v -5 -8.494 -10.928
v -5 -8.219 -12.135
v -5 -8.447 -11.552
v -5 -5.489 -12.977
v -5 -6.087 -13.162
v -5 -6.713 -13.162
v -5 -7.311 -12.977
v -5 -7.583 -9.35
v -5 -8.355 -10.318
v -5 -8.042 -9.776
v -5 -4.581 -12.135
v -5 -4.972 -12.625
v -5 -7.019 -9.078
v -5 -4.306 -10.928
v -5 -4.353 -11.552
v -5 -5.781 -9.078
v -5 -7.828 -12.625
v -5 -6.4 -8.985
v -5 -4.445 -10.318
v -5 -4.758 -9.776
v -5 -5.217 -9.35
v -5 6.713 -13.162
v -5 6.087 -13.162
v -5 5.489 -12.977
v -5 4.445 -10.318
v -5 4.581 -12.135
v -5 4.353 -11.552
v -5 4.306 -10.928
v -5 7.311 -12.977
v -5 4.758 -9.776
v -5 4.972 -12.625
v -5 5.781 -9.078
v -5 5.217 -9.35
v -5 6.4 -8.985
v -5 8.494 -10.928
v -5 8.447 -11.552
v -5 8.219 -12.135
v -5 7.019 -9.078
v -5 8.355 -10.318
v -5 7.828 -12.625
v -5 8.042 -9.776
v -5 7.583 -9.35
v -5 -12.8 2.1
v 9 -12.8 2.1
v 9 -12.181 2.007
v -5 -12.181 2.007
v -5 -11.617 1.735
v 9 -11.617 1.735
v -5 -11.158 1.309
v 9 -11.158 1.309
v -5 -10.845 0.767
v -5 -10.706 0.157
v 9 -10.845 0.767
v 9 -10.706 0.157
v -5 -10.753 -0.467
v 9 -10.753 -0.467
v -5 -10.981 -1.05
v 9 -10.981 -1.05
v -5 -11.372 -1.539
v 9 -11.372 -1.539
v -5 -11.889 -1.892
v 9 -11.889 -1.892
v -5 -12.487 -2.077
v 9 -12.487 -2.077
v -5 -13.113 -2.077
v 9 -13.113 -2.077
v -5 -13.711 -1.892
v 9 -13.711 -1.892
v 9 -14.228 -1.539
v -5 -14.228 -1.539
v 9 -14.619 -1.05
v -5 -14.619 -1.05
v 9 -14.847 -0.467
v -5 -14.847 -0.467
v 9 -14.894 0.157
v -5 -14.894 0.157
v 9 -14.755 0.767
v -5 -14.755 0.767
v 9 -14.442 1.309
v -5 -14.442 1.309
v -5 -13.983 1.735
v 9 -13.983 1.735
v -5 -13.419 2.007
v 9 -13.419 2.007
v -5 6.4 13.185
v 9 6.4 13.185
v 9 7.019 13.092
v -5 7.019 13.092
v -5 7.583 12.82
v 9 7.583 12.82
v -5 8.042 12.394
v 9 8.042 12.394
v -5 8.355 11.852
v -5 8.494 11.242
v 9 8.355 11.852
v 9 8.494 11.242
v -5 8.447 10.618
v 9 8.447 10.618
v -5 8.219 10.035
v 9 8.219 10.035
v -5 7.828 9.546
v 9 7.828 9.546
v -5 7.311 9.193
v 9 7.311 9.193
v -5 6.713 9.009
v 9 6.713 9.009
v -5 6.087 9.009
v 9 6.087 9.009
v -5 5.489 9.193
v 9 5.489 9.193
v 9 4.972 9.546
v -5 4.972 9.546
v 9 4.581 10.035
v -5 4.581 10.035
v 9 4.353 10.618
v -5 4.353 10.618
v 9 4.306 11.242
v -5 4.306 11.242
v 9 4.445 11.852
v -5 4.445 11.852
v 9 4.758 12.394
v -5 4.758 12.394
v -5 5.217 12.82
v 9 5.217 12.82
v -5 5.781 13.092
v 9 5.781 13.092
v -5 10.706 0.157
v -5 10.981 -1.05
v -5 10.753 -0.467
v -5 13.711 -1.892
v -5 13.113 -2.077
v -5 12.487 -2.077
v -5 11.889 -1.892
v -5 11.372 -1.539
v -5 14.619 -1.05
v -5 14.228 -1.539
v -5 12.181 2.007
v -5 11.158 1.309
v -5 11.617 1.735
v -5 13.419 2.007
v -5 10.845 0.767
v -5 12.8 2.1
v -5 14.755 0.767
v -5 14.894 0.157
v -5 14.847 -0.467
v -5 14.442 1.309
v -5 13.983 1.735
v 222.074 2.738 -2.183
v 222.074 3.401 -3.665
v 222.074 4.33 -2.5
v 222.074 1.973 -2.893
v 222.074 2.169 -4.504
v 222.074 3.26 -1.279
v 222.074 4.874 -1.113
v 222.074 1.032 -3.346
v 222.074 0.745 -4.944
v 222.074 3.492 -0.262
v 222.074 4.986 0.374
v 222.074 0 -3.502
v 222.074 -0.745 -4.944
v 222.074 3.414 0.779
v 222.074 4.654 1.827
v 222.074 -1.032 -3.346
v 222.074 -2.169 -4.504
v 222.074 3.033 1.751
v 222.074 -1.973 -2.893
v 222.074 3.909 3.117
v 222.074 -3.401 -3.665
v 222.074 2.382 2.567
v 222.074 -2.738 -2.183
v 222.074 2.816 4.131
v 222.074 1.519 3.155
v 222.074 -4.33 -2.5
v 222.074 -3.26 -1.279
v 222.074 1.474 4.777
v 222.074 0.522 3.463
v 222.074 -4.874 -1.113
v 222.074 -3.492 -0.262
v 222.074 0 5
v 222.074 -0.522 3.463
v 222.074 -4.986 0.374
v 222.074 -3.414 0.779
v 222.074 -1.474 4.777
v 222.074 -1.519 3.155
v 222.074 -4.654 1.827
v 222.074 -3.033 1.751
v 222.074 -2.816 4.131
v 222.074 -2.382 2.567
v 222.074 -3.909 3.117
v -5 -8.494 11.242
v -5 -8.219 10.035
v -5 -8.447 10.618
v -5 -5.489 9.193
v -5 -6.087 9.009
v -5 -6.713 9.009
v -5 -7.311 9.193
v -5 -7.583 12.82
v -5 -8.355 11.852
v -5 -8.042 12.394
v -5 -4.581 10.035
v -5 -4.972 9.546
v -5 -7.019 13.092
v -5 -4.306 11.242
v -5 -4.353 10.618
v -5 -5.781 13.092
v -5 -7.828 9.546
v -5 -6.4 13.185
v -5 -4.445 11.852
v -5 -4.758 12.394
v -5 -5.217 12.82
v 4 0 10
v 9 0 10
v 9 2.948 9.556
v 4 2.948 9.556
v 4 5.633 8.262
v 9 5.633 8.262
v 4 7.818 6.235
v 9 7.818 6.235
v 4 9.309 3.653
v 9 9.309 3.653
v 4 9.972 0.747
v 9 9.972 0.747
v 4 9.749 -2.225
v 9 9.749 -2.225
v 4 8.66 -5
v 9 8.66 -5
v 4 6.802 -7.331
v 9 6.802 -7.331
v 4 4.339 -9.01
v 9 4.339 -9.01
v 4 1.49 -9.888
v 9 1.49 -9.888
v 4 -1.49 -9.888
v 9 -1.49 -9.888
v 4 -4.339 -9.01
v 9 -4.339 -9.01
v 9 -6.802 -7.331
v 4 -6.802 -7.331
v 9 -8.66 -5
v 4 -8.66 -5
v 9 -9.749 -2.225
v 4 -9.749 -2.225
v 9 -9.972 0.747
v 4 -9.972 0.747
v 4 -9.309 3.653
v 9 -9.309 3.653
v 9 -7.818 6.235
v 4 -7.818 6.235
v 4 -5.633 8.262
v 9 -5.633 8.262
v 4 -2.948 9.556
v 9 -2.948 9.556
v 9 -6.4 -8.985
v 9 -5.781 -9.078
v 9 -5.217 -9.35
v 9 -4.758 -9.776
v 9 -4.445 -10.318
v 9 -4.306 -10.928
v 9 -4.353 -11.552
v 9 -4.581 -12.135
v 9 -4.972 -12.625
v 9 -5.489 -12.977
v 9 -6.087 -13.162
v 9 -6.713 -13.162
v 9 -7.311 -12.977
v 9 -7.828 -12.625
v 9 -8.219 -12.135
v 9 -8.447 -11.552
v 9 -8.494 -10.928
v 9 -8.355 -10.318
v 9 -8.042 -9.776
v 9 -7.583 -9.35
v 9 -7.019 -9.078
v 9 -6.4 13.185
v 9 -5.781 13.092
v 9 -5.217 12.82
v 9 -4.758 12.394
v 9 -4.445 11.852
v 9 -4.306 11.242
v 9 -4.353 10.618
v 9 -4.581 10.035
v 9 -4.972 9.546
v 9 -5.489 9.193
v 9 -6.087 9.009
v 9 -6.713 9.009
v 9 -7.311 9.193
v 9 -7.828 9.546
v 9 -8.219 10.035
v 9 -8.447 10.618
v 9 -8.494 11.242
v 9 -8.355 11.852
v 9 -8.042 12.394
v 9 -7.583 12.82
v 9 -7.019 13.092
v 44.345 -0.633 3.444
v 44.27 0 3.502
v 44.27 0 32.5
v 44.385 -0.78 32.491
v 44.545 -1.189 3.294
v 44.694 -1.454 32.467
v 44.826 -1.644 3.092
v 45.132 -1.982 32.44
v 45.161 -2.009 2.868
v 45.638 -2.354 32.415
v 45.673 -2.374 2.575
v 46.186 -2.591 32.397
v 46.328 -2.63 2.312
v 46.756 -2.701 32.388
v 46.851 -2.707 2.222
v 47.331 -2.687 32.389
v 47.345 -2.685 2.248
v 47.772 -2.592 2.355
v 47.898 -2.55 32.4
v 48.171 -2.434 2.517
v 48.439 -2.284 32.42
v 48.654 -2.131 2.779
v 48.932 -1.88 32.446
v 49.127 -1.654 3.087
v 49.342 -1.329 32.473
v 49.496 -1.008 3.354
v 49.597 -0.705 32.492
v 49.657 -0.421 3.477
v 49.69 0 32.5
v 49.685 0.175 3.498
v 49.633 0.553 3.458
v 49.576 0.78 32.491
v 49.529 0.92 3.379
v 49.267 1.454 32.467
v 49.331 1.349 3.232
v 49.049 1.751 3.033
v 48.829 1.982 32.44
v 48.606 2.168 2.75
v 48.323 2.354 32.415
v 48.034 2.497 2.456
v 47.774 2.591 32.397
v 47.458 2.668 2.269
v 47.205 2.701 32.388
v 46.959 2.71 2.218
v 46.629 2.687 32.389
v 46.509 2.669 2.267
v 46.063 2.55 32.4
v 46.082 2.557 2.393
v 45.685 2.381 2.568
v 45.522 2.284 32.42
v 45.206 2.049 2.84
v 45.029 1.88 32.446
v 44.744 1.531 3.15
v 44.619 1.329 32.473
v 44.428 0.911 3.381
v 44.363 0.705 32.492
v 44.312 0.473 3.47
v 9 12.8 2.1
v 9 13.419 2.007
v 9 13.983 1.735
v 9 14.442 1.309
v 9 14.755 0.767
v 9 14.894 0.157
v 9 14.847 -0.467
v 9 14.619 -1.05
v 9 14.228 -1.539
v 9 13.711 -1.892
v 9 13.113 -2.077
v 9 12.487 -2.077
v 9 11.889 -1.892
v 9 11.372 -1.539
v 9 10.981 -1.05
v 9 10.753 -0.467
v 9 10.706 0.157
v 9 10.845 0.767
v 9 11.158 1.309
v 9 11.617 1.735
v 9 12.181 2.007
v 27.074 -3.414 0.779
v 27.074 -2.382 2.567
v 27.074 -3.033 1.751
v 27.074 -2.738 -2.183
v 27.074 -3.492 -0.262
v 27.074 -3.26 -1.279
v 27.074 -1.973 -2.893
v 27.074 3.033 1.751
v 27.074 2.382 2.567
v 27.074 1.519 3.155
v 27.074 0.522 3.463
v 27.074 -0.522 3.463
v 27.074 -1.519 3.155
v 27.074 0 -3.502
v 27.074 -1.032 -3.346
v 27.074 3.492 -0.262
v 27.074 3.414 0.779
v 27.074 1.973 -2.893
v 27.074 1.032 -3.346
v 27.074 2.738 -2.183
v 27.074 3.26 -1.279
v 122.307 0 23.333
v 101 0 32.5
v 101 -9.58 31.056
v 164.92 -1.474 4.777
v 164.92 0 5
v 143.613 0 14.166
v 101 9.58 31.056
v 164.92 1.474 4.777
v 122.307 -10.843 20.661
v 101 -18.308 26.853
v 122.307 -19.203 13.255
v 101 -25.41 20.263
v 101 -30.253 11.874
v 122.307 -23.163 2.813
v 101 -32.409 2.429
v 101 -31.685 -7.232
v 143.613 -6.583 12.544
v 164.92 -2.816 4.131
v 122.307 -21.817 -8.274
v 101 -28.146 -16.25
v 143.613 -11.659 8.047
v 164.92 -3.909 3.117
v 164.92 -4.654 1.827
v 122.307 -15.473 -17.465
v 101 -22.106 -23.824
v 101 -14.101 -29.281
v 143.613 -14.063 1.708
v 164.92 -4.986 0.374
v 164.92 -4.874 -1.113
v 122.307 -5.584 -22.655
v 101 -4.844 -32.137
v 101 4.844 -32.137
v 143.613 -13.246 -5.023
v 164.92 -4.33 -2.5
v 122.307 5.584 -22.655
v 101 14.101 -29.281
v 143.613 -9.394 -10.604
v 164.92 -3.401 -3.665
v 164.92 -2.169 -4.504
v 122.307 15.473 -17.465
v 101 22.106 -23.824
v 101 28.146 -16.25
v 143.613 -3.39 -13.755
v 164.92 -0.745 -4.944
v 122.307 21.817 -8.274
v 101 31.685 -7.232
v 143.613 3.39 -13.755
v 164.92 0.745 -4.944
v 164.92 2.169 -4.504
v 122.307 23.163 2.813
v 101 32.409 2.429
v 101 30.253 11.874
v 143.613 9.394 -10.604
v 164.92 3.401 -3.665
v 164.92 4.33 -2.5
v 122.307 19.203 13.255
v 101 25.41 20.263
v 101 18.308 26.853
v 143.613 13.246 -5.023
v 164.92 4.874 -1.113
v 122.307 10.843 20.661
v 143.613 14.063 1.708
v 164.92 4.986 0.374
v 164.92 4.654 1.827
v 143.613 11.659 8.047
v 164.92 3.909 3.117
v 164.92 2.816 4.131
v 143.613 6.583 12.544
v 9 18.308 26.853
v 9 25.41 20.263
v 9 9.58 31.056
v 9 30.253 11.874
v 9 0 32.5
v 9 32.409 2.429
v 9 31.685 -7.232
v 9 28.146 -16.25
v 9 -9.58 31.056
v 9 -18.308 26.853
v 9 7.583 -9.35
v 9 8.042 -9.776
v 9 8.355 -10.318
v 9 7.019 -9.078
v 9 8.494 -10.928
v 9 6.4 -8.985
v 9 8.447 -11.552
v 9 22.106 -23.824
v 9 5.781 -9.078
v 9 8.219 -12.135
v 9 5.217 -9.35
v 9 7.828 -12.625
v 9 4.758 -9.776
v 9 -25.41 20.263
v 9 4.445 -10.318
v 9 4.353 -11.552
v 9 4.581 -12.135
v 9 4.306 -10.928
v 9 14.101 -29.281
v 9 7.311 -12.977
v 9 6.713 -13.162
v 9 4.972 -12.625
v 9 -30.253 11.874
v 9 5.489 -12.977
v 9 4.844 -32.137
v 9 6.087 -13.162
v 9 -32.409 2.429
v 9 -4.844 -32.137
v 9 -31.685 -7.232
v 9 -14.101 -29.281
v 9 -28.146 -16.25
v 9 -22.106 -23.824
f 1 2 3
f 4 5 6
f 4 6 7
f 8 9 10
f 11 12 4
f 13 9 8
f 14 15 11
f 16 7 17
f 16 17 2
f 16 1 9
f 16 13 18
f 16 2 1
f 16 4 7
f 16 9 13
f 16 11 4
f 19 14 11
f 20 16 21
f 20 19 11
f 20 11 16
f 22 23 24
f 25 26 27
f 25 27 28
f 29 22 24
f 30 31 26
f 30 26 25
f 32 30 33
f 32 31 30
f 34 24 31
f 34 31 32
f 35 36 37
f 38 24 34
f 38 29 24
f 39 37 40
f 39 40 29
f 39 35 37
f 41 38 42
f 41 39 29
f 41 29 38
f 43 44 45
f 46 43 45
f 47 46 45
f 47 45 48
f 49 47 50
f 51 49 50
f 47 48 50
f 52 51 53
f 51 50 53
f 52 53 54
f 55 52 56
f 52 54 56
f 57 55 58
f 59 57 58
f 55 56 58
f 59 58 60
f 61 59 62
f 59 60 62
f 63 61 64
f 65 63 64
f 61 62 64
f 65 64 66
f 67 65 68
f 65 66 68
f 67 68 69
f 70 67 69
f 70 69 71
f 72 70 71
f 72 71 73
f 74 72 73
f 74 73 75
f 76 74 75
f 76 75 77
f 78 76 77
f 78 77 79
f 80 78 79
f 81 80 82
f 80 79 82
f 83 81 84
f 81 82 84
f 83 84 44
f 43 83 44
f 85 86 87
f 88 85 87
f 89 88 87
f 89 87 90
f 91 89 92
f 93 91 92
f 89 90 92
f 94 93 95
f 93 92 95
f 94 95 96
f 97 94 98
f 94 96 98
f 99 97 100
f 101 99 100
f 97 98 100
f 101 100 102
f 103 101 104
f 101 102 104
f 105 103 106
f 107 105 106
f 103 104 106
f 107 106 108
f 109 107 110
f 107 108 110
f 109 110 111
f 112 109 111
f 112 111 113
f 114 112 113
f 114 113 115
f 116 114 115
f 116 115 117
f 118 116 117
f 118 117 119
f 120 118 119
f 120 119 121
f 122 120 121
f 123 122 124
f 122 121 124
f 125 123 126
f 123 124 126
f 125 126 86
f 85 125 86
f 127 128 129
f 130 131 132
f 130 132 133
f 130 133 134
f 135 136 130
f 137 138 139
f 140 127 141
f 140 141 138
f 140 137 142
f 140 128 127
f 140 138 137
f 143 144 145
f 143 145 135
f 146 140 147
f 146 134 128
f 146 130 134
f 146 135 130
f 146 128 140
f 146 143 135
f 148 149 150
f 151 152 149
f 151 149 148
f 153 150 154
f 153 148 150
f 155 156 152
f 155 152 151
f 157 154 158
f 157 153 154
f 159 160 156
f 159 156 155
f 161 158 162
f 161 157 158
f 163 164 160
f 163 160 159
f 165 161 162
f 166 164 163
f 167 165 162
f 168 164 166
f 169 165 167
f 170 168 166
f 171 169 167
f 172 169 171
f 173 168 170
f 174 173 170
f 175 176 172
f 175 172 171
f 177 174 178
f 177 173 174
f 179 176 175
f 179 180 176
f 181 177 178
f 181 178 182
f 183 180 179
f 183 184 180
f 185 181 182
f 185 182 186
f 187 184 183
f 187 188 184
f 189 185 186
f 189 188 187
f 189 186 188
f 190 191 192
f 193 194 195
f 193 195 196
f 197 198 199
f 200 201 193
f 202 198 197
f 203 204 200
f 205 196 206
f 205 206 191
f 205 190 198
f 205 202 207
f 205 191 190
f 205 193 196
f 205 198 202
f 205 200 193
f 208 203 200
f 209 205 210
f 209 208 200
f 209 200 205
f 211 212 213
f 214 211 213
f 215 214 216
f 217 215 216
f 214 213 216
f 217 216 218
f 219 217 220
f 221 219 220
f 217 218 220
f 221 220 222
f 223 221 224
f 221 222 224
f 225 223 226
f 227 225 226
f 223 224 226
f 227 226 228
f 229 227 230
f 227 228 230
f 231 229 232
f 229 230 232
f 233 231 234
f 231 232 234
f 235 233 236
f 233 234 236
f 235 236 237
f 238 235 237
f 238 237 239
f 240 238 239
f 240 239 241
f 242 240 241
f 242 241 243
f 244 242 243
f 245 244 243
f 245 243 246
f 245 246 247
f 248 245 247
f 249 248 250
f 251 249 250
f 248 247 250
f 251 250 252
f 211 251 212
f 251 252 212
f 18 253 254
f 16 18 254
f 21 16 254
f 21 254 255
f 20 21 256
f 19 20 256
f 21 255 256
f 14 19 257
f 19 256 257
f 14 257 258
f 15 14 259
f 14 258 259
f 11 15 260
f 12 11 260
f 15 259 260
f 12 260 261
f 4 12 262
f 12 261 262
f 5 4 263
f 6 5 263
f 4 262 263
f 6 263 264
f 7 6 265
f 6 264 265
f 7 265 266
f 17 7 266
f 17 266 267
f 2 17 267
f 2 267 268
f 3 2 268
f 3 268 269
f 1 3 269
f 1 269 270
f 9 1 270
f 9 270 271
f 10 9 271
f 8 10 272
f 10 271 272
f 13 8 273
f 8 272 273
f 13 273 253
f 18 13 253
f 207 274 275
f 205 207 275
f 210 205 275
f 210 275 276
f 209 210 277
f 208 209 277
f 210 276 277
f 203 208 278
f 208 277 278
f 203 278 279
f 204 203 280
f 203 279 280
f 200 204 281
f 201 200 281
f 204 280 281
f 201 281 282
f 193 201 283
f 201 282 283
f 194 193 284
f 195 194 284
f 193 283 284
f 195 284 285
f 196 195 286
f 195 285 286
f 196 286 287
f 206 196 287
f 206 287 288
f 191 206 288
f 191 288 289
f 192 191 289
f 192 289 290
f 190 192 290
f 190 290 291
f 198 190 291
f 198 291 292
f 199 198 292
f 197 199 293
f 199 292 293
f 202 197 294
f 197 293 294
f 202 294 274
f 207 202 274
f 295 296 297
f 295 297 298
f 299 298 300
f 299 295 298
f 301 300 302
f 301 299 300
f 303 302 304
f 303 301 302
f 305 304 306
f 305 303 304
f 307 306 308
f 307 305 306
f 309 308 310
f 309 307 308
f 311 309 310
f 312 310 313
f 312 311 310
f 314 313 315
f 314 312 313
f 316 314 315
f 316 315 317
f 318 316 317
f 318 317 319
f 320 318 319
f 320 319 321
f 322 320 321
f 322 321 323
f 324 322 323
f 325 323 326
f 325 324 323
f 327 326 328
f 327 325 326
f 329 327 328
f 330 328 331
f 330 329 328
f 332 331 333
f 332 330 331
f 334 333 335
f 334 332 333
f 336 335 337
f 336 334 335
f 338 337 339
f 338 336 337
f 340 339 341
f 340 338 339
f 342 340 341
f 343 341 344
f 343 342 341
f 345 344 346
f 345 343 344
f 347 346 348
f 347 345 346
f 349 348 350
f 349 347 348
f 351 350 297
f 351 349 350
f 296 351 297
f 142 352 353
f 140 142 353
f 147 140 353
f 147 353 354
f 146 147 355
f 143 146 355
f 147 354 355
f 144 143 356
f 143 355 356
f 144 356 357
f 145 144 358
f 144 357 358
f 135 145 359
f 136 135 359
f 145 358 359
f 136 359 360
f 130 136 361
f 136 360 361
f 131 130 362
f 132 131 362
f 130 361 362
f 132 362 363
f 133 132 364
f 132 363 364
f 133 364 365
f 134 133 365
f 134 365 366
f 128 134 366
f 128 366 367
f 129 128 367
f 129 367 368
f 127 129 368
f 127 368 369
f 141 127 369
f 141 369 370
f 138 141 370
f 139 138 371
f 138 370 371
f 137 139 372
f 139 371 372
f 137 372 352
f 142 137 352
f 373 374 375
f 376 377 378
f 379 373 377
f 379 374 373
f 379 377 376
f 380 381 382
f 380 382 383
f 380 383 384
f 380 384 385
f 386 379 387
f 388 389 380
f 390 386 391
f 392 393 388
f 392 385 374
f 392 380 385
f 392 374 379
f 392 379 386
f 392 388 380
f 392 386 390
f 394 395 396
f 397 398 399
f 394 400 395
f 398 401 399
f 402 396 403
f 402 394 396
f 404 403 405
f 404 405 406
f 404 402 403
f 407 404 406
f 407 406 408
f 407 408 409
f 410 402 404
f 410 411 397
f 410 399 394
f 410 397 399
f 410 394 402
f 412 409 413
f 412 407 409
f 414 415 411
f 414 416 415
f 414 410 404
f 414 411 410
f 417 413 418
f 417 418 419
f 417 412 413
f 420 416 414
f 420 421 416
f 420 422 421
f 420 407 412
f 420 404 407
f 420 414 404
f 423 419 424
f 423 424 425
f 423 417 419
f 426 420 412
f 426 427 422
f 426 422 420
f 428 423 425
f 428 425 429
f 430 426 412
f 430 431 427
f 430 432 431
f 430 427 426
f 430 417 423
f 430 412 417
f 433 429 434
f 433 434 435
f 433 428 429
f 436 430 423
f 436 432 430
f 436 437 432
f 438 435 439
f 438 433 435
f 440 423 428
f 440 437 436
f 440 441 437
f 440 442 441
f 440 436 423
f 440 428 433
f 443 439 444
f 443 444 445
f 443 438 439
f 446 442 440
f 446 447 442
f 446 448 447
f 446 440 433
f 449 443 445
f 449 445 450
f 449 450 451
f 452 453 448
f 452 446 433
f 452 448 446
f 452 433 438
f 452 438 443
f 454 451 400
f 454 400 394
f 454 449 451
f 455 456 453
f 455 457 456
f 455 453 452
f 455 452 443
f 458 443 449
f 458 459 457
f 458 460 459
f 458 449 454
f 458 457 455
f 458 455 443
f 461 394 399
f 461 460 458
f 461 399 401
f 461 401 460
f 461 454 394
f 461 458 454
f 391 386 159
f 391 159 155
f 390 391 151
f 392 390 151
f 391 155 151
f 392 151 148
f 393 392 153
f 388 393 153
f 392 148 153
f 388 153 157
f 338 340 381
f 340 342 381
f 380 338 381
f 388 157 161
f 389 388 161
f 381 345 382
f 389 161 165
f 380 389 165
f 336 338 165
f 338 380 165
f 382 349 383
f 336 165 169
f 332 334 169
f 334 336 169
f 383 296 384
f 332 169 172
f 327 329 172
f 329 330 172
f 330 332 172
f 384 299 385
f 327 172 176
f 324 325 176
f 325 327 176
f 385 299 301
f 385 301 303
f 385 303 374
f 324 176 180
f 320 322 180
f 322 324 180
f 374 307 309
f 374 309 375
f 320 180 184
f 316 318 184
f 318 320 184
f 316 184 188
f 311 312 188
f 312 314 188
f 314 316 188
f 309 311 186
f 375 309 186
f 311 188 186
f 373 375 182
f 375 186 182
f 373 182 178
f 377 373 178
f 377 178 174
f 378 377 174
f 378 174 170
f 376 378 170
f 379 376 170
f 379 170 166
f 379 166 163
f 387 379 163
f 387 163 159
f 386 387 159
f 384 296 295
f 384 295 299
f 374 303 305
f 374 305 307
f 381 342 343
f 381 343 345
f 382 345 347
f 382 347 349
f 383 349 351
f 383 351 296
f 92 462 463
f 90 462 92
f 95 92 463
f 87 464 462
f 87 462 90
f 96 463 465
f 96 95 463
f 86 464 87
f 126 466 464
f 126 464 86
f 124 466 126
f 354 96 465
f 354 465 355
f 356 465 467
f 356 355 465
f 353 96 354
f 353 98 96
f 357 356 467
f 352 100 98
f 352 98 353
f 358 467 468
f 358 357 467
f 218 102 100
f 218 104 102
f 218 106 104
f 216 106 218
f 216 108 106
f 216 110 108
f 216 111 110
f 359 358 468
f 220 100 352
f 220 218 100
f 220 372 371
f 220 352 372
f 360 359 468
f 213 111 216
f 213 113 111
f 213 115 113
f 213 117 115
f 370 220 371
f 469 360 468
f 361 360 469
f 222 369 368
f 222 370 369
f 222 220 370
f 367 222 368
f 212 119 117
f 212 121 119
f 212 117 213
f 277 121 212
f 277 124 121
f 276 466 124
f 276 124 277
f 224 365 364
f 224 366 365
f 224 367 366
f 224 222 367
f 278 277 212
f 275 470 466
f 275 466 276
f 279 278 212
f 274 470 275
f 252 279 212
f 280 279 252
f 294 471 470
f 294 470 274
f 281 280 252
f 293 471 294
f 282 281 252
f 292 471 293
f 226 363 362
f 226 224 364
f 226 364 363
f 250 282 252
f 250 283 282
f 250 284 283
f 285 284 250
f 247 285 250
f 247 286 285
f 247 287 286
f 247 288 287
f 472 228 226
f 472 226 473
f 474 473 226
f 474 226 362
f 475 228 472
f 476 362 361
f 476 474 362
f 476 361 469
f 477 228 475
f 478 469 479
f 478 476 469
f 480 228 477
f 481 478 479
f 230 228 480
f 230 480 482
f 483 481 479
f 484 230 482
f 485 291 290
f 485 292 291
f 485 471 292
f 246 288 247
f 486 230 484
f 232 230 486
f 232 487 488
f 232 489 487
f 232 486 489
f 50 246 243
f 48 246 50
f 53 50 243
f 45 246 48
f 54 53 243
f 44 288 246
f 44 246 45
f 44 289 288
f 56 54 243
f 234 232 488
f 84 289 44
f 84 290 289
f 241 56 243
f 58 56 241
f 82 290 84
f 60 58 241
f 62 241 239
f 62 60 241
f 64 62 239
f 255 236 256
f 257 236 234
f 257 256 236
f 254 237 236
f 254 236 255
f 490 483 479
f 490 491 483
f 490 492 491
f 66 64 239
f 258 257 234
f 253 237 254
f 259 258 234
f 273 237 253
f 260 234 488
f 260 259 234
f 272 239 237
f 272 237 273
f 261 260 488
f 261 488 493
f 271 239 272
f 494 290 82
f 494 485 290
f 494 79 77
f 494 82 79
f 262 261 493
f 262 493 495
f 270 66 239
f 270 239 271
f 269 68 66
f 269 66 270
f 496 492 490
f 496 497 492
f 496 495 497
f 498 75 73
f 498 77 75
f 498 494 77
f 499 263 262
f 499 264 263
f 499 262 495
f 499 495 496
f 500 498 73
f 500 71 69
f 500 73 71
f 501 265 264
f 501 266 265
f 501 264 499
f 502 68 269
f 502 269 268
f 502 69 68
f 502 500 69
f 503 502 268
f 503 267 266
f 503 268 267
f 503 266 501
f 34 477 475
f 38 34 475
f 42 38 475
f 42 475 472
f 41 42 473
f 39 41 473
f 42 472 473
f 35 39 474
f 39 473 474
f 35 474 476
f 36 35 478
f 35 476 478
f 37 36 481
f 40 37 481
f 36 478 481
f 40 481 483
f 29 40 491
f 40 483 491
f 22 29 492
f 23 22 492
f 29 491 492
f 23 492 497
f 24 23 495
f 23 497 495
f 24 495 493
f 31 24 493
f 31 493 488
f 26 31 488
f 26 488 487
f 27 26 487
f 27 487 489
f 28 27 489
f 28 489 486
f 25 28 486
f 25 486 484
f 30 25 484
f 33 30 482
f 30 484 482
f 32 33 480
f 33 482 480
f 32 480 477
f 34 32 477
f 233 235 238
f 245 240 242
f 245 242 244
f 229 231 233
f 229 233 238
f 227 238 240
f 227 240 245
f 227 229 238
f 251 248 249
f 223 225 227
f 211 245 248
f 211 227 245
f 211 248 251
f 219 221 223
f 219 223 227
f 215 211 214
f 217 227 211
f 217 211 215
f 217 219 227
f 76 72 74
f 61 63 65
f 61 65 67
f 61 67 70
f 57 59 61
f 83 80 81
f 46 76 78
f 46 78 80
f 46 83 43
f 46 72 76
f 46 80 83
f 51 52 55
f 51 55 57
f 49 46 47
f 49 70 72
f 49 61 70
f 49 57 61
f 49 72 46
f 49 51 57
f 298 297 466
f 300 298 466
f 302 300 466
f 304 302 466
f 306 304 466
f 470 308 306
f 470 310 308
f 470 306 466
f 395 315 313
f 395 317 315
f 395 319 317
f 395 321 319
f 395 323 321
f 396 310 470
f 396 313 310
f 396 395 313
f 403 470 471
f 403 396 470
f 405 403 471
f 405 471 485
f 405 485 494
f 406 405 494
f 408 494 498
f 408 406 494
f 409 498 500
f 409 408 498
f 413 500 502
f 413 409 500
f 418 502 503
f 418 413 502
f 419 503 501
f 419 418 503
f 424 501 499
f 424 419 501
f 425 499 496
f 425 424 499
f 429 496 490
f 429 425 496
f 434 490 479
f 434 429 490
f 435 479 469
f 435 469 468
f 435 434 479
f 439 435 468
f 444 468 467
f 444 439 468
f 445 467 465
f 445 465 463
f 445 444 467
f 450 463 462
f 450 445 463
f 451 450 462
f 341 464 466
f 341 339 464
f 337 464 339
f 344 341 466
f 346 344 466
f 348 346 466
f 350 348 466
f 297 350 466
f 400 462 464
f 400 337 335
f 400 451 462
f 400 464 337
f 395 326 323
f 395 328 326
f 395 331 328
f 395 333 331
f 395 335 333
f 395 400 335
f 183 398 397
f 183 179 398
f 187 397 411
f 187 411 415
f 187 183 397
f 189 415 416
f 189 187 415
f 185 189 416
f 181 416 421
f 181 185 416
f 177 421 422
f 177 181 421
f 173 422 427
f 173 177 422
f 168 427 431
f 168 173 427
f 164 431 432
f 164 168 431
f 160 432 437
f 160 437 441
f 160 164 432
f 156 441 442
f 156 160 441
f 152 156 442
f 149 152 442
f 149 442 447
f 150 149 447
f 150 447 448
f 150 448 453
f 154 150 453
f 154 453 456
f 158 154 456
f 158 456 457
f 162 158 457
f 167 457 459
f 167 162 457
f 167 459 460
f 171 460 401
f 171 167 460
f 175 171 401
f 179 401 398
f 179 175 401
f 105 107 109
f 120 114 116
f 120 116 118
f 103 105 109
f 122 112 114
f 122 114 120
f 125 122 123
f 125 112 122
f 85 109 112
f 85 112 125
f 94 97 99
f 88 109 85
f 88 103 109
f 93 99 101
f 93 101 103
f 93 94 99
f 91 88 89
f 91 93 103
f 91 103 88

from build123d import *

# Parameters (mm, degrees)
ESBO_O2_R                = 2.1
RESSALTO_EXTRUS_O1_DEPTH = 14
ESBO_O3_R                = 10
RESSALTO_EXTRUS_O2_DEPTH = 5
ESBO_O4_R                = 3.50196924
CORTE_EXTRUS_O1_DEPTH    = 195
ESBO_O5_R                = 2.71004316
CORTE_EXTRUS_O2_DEPTH    = 45


with BuildPart() as part:
    # Esboço1 → Revolução1 (revolve)
    with BuildSketch(Plane.XY, mode=Mode.PRIVATE) as revolu_o1_sk:
        Polygon((9, 0), (9, -32.5), (101, -32.5), (164.919887291, -4.999614615), (222.073865158, -4.999614615), (222.073865158, 0), (164.919887291, 0), align=None)
    revolve(revolu_o1_sk.sketch.rotate(Axis((9, 0, 0), (1, 0, 0)), 270), axis=Axis((9, 0, 0), (1, 0, 0)))

    # Esboço2 → Ressalto-extrusão1 (add)
    with BuildSketch(Plane.ZY.offset(-9)):
        with Locations((0, 12.8)):
            Circle(ESBO_O2_R)
        with Locations((11.085125168, 6.4)):
            Circle(ESBO_O2_R)
        with Locations((11.085125168, -6.4)):
            Circle(ESBO_O2_R)
        with Locations((0, -12.8)):
            Circle(ESBO_O2_R)
        with Locations((-11.085125168, -6.4)):
            Circle(ESBO_O2_R)
        with Locations((-11.085125168, 6.4)):
            Circle(ESBO_O2_R)
    extrude(amount=RESSALTO_EXTRUS_O1_DEPTH)

    # Esboço3 → Ressalto-extrusão2 (add)
    with BuildSketch(Plane.ZY.offset(-9)):
        Circle(ESBO_O3_R)
    extrude(amount=RESSALTO_EXTRUS_O2_DEPTH)

    # Esboço4 → Corte-extrusão1 (cut)
    with BuildSketch(Plane(origin=(222.073865158, 0, 0), x_dir=(0, 0, -1), z_dir=(1, 0, 0))):
        Circle(ESBO_O4_R)
    extrude(amount=-CORTE_EXTRUS_O1_DEPTH, mode=Mode.SUBTRACT)

    # Esboço5 → Corte-extrusão2 (cut)
    with BuildSketch(Plane.XY):
        with Locations(Location((46.980237951, 0, 0), (0, 0, 180))):
            Circle(ESBO_O5_R)
    extrude(amount=CORTE_EXTRUS_O2_DEPTH, mode=Mode.SUBTRACT)


solid = part.part
